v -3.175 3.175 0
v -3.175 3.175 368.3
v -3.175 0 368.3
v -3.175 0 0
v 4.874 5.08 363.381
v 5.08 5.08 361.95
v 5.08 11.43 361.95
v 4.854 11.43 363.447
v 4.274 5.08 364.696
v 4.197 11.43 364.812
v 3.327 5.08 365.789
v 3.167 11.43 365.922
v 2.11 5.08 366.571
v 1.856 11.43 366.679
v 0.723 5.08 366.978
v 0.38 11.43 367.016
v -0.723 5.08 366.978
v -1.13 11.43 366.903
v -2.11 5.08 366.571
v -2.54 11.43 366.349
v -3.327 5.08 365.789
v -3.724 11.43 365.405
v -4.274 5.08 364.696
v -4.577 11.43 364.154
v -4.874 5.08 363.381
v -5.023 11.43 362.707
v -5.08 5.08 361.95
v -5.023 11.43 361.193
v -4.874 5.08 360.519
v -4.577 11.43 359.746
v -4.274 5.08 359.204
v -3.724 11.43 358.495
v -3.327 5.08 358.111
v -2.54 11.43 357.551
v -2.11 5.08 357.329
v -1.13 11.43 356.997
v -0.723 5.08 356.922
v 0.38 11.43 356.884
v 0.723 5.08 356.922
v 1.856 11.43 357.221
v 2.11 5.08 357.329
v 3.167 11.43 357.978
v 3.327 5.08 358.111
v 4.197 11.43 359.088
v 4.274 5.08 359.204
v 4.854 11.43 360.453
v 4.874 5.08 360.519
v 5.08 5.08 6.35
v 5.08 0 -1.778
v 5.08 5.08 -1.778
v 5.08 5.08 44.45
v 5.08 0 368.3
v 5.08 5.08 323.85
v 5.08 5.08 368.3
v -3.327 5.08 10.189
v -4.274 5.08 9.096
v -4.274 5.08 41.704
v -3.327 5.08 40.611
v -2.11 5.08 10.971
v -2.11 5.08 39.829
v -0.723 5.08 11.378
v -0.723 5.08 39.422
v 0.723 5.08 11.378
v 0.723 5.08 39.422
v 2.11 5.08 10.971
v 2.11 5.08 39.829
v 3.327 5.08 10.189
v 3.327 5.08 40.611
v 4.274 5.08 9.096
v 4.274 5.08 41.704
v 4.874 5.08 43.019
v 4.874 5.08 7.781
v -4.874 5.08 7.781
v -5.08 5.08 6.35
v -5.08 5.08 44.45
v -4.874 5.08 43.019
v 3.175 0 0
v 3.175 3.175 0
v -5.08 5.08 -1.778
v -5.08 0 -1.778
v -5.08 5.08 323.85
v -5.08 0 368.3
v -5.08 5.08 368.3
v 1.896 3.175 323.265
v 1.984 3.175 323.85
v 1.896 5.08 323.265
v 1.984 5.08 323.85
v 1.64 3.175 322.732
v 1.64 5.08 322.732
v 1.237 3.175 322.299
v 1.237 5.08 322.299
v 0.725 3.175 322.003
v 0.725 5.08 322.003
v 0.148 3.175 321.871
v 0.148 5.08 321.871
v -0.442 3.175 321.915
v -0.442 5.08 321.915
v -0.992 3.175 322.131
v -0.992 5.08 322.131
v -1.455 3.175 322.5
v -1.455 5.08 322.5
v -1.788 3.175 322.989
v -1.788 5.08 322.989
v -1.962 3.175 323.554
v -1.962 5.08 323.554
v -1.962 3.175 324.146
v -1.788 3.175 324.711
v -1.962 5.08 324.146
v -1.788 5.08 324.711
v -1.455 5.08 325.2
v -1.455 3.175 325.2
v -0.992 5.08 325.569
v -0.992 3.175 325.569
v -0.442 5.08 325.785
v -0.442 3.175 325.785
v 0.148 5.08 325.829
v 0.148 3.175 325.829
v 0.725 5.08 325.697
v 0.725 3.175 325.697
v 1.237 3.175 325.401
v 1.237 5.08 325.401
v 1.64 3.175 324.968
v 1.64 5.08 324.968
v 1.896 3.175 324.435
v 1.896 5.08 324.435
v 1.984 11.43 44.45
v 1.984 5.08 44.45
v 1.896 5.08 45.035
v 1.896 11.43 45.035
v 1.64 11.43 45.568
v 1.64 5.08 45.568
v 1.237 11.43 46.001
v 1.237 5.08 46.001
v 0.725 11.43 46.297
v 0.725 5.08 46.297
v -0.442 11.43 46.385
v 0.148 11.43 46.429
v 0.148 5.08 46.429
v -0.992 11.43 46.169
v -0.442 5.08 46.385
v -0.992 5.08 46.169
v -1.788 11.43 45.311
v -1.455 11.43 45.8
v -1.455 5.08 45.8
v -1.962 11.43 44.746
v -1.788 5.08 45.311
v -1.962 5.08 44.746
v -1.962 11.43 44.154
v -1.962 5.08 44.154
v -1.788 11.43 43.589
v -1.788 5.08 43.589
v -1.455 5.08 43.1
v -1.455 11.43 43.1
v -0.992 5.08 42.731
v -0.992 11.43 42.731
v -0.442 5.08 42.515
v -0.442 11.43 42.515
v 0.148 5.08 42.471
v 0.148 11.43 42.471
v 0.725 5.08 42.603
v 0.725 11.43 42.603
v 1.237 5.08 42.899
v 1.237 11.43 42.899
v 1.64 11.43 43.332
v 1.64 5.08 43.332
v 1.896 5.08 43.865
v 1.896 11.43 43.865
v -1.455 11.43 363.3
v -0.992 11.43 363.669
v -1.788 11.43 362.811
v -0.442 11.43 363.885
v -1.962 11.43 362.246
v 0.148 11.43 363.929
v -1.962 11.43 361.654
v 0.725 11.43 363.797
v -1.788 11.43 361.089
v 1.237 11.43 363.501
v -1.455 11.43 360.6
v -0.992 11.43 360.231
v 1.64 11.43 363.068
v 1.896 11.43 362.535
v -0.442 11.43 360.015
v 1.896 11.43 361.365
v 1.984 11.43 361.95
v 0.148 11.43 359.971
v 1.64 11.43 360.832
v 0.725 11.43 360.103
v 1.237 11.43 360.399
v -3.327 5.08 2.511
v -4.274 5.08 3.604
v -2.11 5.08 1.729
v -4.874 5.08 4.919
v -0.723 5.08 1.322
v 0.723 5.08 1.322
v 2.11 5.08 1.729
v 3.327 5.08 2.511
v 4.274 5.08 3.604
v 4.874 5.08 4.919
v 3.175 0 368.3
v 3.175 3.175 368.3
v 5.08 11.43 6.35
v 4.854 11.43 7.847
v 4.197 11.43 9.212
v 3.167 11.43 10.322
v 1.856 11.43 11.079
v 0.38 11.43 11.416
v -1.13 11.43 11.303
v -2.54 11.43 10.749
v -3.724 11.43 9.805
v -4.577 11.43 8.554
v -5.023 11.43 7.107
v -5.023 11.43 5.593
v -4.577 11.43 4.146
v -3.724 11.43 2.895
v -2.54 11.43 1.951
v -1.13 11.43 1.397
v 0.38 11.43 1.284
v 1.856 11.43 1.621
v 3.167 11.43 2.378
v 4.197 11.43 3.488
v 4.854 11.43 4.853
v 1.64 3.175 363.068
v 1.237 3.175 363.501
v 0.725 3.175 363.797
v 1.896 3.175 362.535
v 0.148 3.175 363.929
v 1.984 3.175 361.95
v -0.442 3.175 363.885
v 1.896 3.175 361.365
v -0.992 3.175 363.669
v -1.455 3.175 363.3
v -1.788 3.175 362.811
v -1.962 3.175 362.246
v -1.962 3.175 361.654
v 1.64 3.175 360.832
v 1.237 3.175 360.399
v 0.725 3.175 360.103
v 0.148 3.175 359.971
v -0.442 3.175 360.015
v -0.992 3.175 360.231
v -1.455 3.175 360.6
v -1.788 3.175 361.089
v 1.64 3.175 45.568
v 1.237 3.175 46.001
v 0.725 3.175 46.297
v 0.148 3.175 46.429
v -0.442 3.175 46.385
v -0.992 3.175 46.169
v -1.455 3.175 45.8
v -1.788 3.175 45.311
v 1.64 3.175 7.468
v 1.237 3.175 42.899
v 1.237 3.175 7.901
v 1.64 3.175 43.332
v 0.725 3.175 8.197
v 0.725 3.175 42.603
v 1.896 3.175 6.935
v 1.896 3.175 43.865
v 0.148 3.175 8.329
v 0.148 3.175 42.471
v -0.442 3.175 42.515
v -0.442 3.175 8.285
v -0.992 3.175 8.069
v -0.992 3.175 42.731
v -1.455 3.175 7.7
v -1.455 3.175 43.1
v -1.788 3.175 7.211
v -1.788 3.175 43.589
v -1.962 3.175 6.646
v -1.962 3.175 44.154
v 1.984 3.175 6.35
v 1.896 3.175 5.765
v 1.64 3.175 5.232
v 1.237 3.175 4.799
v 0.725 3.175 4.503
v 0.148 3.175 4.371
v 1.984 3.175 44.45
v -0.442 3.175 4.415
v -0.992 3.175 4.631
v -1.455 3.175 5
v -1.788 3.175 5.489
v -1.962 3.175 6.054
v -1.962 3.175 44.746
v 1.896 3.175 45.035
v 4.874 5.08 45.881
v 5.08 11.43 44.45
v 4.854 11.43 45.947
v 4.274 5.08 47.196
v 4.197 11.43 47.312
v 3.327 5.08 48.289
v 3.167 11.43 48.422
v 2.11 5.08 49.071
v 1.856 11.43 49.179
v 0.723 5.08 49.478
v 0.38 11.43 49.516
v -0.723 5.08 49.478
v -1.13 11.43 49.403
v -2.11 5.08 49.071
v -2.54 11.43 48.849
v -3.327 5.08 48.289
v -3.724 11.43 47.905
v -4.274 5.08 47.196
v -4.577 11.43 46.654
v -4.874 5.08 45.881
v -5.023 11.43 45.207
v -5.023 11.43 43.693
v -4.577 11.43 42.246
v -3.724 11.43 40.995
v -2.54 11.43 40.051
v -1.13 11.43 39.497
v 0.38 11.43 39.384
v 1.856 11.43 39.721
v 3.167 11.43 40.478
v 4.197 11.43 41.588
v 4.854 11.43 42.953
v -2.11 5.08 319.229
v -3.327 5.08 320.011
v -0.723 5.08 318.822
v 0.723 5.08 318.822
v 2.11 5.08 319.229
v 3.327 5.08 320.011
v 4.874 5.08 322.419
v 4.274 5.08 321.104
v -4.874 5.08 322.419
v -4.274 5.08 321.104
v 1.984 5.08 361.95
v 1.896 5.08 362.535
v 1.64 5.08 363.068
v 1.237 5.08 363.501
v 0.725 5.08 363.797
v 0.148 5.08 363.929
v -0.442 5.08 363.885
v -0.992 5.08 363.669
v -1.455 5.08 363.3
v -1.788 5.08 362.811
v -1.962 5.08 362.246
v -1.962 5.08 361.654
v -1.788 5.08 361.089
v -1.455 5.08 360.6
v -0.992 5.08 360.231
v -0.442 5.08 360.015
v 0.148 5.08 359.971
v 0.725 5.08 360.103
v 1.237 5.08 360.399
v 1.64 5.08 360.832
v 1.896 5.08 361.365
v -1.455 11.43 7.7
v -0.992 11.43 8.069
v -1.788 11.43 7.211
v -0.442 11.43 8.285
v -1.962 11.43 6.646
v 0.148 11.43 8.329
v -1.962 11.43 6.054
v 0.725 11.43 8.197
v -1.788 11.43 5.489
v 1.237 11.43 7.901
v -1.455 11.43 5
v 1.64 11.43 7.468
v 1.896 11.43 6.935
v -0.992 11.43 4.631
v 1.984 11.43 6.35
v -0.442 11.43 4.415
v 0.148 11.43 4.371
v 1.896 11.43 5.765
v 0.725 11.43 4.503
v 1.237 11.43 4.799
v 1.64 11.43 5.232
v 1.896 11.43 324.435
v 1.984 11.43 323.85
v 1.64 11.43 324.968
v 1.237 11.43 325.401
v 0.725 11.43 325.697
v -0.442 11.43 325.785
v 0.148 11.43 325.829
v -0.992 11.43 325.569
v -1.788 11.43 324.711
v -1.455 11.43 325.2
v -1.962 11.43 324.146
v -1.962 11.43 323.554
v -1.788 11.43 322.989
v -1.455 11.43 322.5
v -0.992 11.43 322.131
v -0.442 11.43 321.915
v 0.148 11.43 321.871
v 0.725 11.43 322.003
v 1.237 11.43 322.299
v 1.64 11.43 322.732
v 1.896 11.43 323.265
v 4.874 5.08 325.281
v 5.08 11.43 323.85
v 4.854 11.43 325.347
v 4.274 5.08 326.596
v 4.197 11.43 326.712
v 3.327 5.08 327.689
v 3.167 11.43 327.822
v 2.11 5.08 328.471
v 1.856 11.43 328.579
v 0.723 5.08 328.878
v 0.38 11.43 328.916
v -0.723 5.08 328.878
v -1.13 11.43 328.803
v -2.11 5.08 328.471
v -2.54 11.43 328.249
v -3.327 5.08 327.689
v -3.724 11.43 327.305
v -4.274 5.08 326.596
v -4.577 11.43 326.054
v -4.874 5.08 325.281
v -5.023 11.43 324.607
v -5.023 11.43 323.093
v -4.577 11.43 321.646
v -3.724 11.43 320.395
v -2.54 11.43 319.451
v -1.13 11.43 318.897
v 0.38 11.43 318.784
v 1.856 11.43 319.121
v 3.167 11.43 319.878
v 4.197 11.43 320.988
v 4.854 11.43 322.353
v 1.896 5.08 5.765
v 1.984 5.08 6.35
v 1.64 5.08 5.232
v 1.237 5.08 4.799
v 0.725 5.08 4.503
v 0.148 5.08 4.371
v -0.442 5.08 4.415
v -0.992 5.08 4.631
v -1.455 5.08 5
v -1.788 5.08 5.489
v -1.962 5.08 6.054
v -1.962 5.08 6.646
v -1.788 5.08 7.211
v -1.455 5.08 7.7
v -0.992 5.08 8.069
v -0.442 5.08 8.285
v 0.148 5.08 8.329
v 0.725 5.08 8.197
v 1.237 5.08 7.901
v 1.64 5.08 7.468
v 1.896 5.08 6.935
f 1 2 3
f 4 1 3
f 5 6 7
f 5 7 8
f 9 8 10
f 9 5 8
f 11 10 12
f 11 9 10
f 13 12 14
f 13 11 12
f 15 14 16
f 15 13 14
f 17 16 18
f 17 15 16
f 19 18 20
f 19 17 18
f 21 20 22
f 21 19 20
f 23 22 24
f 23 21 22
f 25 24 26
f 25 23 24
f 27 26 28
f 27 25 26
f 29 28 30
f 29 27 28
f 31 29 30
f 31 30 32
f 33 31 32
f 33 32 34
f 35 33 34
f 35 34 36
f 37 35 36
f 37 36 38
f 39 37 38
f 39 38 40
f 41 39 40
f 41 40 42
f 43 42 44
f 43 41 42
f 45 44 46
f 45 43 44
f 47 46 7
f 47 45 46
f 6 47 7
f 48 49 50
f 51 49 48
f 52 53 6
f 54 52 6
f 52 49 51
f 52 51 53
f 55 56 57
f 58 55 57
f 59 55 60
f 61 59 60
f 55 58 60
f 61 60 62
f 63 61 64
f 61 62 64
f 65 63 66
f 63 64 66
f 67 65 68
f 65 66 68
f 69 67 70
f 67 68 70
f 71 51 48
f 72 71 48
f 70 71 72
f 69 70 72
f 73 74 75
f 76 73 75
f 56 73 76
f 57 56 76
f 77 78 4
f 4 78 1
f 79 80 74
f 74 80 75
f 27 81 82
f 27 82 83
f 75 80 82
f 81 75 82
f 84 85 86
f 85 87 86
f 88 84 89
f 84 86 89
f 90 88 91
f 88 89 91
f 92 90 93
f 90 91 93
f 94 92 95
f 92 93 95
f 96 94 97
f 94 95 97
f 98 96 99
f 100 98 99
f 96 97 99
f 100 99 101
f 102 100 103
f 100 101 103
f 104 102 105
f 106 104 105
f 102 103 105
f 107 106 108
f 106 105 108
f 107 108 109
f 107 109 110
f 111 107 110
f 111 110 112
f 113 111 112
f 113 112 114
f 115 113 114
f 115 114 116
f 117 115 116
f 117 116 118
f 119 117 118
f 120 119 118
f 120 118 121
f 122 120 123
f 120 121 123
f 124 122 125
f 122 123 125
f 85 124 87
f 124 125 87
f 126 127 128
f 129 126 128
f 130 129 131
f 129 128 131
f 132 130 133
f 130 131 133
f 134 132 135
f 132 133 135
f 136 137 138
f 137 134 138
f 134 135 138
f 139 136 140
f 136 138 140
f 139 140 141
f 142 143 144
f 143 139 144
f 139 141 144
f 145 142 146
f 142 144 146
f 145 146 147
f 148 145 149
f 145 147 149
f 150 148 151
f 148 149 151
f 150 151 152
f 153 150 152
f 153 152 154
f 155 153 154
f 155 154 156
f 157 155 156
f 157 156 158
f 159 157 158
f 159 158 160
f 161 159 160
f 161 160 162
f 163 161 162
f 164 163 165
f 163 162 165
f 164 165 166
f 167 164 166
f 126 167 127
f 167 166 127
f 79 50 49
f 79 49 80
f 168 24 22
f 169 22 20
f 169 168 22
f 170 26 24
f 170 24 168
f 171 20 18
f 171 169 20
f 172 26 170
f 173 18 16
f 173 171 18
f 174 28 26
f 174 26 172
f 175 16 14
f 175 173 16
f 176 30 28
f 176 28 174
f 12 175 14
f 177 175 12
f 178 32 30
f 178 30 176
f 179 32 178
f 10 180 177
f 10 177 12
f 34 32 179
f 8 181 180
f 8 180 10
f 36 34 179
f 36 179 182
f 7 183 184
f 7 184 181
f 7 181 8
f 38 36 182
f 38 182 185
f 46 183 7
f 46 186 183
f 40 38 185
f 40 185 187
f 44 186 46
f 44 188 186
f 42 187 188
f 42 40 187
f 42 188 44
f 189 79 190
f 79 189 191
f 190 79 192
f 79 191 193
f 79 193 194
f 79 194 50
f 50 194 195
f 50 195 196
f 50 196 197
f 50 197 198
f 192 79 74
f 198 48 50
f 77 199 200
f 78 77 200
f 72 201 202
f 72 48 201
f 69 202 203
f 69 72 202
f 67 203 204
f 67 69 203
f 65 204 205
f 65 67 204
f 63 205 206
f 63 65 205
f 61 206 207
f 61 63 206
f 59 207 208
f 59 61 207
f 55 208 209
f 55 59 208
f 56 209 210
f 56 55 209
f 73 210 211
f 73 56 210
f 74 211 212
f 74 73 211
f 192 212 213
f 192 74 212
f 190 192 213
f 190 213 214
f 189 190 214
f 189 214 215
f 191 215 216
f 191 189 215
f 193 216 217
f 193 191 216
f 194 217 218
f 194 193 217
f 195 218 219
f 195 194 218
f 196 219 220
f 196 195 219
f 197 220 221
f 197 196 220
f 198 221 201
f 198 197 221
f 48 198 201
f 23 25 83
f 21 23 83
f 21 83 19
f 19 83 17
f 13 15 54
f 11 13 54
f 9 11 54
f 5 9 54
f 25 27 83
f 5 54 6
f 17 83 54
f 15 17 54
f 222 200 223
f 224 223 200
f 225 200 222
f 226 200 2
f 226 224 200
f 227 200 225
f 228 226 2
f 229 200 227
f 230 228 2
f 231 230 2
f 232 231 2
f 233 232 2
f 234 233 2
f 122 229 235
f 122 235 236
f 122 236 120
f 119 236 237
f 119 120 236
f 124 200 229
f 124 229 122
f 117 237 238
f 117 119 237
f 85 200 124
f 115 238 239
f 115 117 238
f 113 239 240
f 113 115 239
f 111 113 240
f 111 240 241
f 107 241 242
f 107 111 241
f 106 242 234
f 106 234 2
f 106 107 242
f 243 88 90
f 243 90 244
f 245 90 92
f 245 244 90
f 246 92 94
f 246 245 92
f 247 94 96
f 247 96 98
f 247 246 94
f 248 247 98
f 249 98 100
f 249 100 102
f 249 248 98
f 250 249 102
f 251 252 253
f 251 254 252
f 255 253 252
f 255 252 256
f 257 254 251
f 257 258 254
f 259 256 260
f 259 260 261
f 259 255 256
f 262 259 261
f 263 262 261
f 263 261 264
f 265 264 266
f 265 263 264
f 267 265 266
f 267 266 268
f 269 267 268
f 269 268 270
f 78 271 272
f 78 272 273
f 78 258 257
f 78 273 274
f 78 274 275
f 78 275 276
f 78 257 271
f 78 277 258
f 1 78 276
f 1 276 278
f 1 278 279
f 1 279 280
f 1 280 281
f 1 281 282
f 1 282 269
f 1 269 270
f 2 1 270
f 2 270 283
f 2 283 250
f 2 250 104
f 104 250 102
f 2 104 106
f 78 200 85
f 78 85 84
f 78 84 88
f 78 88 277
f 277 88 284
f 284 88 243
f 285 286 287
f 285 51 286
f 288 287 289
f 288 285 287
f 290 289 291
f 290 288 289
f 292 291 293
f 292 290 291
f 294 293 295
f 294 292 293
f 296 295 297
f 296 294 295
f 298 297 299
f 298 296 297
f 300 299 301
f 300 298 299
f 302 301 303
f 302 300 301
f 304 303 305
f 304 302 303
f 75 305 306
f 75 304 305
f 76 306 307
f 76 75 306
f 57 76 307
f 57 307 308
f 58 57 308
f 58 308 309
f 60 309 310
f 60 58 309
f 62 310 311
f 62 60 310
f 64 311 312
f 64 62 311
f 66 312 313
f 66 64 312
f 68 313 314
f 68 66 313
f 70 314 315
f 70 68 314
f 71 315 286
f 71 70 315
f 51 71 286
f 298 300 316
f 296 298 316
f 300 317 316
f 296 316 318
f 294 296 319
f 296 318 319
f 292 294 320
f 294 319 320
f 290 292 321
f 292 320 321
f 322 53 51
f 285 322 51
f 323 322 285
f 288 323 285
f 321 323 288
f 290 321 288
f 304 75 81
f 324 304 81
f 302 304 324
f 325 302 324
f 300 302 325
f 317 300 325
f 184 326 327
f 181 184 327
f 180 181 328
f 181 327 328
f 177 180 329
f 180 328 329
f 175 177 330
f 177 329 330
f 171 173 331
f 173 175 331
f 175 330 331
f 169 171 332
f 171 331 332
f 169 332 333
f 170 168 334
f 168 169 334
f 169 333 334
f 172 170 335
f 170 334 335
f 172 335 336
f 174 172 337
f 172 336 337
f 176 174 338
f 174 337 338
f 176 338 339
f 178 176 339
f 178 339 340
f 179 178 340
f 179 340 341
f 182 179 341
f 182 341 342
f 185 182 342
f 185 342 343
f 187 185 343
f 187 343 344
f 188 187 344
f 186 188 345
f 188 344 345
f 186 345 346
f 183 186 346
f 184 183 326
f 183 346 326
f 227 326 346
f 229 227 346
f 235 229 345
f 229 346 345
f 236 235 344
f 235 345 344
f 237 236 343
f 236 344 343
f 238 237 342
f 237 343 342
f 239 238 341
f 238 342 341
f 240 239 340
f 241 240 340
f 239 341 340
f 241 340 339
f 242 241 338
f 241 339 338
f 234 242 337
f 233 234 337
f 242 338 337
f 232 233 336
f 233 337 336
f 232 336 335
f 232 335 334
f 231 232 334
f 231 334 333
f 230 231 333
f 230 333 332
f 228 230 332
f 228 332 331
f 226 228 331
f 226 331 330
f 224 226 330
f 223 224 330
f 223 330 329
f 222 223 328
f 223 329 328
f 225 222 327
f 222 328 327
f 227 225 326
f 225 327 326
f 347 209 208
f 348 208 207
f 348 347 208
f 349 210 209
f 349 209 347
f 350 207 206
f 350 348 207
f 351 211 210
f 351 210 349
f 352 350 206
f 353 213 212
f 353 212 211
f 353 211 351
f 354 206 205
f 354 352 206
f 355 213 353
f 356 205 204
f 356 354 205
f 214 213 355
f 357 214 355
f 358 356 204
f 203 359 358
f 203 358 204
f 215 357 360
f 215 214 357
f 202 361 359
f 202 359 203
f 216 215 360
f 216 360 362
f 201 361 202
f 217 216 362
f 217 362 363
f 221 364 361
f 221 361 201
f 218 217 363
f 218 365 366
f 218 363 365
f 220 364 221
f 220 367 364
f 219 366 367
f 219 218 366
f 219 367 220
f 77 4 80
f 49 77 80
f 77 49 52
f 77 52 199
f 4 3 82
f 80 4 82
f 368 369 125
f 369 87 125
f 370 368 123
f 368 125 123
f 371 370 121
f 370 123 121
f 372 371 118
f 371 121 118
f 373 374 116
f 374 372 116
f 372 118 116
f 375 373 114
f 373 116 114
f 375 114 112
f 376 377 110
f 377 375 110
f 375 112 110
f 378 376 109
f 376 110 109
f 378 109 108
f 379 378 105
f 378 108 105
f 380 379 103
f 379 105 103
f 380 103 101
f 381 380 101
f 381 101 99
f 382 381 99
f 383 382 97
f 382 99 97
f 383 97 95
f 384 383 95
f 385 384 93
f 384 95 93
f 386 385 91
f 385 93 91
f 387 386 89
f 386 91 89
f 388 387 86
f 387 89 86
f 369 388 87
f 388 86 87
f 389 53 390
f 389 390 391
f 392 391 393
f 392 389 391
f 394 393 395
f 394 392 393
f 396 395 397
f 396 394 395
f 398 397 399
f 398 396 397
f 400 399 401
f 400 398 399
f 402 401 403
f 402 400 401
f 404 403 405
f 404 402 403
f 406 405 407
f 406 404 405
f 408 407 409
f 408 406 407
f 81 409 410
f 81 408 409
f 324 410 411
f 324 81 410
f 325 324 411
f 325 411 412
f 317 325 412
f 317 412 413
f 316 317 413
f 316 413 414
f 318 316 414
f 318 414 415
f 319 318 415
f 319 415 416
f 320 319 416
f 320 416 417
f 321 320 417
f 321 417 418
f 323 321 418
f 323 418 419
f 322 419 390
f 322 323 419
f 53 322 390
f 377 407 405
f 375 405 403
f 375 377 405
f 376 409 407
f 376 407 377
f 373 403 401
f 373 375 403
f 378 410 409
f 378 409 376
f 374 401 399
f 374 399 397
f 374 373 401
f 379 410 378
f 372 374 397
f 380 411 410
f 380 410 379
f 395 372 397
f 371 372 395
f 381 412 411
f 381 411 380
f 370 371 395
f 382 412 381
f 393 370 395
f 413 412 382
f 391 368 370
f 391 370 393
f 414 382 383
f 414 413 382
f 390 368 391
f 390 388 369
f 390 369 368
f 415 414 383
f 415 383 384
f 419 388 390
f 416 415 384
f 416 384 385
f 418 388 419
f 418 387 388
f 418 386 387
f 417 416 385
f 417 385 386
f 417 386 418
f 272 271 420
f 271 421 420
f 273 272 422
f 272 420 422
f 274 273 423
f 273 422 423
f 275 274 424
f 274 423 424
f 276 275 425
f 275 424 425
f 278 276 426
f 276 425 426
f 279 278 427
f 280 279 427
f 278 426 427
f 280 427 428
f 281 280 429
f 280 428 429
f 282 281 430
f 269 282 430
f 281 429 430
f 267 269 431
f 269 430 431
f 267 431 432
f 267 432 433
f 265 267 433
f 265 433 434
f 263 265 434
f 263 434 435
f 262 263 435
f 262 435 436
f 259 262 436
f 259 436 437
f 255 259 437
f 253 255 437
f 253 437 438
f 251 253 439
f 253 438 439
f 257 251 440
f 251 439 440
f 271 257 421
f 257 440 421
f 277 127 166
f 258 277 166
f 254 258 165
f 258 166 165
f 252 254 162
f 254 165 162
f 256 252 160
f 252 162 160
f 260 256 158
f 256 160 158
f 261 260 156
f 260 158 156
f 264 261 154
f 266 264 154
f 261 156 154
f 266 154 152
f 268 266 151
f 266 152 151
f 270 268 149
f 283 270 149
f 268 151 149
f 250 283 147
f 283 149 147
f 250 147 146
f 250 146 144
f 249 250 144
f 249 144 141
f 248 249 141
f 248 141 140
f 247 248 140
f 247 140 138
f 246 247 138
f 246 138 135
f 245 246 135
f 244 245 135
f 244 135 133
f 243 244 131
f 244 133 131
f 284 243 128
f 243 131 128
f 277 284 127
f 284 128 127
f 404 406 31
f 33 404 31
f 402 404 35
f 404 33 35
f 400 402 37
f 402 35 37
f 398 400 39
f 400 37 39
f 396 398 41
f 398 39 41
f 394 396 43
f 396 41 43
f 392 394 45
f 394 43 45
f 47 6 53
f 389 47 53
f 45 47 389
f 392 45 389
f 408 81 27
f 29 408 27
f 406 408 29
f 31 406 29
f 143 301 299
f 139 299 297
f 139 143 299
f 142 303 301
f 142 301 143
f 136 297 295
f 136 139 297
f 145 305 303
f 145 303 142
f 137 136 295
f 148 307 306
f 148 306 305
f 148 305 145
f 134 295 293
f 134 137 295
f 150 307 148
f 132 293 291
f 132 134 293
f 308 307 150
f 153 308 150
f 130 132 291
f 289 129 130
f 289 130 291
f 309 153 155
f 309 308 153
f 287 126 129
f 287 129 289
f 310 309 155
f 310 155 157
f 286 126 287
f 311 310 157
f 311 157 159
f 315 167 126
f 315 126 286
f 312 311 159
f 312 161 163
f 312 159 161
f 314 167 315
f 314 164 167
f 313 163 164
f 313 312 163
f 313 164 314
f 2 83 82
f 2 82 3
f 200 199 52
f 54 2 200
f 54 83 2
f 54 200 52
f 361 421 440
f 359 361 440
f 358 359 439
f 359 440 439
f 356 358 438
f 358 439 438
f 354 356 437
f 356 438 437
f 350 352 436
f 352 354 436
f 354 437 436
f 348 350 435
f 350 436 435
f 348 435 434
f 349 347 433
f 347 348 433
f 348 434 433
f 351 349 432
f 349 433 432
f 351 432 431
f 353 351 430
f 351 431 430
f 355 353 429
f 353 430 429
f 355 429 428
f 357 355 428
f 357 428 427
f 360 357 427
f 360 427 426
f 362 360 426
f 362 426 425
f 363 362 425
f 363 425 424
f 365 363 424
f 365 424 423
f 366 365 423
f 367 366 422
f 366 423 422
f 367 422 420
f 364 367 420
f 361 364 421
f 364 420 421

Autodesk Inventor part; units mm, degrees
ref_plane "YZ Plane" through (0, 0, 0) normal (1, 0, 0) x (0, 1, 0)
ref_plane "XZ Plane" through (0, 0, 0) normal (0, 1, 0) x (-1, 0, 0)
ref_plane "XY Plane" through (0, 0, 0) normal (0, 0, 1) x (1, 0, 0)
sketch "Sketch1" plane through (0, 0, 0) normal (0, 0, 1) x (1, 0, 0)
  line L0 (3.175, 0) -> (3.175, 3.175)
  line L1 (3.175, 3.175) -> (-3.175, 3.175)
  line L2 (-3.175, 3.175) -> (-3.175, 0)
  line L3 (-5.08, 0) -> (-5.08, 5.08)
  line L4 (-5.08, 5.08) -> (5.08, 5.08)
  line L5 (5.08, 5.08) -> (5.08, 0)
  line L6 (5.08, 0) -> (3.175, 0)
  line L7 (-3.175, 0) -> (-5.08, 0)
  point P0 (0, 0)
  dimension "d0" = 10.16
  dimension "d1" = 5.08
extrude "Extrusion1" add sketch "Sketch1" along normal blind 368.3
sketch "Sketch2" plane through (-5.08, 5.08, 0) normal (0, 1, 0) x (1, 0, 0)
  circle A0 centre (5.08, -6.35) radius 1.9844
  circle A1 centre (5.08, -44.45) radius 1.9844
  circle A2 centre (5.08, -361.95) radius 1.9844
  circle A3 centre (5.08, -323.85) radius 1.9844
  point P0 (5.08, 0)
  dimension "d4" = 3.9688
  dimension "d5" = 3.9688
  dimension "d6" = 3.9688
  dimension "d7" = 3.9688
extrude "Extrusion2" cut sketch "Sketch2" against normal blind 368.3
sketch "Sketch3" plane through (0, 0, 0) normal (0, 0, -1) x (-1, 0, 0)
  line L0 (-5.08, 0) -> (-5.08, 5.08) projected
  line L1 (5.08, 5.08) -> (-5.08, 5.08)
  line L2 (-5.08, 5.08) -> (-5.08, 0)
  line L3 (-5.08, 0) -> (5.08, 0)
  line L4 (5.08, 0) -> (5.08, 5.08)
  point P0 (0, 0)
sketch "Sketch4" plane through (0, 0, 0) normal (0, 0, -1) x (-1, 0, 0)
  point P0 (0, 0)
extrude "Extrusion3" add sketch "Sketch3" along normal blind 1.778
sketch "Sketch5" plane through (-5.08, 5.08, 368.3) normal (0, 1, 0) x (1, 0, 0)
  circle A0 centre (5.08, 6.35) radius 1.9844 projected
  circle A1 centre (5.08, 44.45) radius 1.9844 projected
  circle A2 centre (5.08, 323.85) radius 1.9844 projected
  circle A3 centre (5.08, 361.95) radius 1.9844 projected
  circle A4 centre (5.08, 6.35) radius 5.08
  line L0 (10.16, 0) -> (10.16, 370.078) projected
  circle A5 centre (5.08, 44.45) radius 5.08
  circle A6 centre (5.08, 323.85) radius 5.08
  circle A7 centre (5.08, 361.95) radius 5.08
  point P0 (5.08, 368.3)
extrude "Extrusion4" add sketch "Sketch5" along normal blind 6.35
properties part number "hs_intake_cb_jig"
